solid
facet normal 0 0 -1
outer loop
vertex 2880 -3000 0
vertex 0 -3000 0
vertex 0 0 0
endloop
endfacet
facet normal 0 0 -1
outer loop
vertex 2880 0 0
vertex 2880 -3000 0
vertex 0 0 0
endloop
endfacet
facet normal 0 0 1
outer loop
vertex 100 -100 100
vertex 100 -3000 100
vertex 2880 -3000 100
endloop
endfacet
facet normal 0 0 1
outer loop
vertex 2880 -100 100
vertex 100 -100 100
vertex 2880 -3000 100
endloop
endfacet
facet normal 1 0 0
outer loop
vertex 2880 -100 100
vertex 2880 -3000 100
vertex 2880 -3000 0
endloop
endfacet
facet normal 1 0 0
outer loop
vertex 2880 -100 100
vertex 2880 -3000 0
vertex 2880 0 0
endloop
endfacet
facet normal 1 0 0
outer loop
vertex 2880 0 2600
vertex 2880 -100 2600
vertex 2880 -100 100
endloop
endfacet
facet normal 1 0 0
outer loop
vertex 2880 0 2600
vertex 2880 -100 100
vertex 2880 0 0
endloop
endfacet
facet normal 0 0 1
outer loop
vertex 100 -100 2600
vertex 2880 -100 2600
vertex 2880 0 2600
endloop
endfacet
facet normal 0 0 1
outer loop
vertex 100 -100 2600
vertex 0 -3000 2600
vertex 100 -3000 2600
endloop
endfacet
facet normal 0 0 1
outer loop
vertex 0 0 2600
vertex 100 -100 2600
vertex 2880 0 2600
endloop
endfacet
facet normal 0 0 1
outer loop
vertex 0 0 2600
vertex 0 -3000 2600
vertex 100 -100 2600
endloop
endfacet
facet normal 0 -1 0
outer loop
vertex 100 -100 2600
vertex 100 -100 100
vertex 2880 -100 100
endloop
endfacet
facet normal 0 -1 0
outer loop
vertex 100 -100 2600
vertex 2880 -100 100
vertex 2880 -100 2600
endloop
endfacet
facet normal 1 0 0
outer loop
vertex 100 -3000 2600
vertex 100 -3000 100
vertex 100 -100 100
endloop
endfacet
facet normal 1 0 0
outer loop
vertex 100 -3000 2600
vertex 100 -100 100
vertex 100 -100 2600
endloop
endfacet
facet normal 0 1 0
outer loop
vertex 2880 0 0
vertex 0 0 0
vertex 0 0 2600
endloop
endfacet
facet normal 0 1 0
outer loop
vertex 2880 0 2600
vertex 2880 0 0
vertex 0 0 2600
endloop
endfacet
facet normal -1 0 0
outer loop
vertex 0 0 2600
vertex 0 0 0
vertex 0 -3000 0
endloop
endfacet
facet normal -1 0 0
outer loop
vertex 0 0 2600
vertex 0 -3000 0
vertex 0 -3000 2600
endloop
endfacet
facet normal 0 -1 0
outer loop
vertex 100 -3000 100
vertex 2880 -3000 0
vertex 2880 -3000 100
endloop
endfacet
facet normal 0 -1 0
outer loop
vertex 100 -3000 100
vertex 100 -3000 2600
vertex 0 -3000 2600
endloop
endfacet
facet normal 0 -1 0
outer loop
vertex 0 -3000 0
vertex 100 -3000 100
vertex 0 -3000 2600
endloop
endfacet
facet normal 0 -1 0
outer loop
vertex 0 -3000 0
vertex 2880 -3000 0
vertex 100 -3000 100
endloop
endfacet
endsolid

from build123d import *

# Parameters (mm, degrees)
F0_W     = 100
F0_H     = 2600
F1_DEPTH = 3000
F2_W     = 100
F2_H     = 2600
F3_DEPTH = 2780
F4_W     = 2780
F4_H     = 2900
F5_DEPTH = 100


with BuildPart() as f1:
    # F0 (on Front) → F1 (new body)
    with BuildSketch(Plane.XZ):
        with Locations((50, 1300)):
            Rectangle(F0_W, F0_H)
    extrude(amount=F1_DEPTH)

    # F2 (on face) → F3 (join)
    with BuildSketch(Plane.YZ.offset(100)):
        with Locations((-50, 1300)):
            Rectangle(F2_W, F2_H)
    extrude(amount=F3_DEPTH)

    # F4 (on face) → F5 (join)
    with BuildSketch(Plane(origin=(0, 0, 0), x_dir=(1, 0, 0), z_dir=(0, 0, -1))):
        Polygon((100, 3000), (0, 3000), (0, 0), (2880, 0), (2880, 100), (100, 100), align=None)
        with Locations((1490, 1550)):
            Rectangle(F4_W, F4_H)
    extrude(amount=-F5_DEPTH)


solid = f1.part
